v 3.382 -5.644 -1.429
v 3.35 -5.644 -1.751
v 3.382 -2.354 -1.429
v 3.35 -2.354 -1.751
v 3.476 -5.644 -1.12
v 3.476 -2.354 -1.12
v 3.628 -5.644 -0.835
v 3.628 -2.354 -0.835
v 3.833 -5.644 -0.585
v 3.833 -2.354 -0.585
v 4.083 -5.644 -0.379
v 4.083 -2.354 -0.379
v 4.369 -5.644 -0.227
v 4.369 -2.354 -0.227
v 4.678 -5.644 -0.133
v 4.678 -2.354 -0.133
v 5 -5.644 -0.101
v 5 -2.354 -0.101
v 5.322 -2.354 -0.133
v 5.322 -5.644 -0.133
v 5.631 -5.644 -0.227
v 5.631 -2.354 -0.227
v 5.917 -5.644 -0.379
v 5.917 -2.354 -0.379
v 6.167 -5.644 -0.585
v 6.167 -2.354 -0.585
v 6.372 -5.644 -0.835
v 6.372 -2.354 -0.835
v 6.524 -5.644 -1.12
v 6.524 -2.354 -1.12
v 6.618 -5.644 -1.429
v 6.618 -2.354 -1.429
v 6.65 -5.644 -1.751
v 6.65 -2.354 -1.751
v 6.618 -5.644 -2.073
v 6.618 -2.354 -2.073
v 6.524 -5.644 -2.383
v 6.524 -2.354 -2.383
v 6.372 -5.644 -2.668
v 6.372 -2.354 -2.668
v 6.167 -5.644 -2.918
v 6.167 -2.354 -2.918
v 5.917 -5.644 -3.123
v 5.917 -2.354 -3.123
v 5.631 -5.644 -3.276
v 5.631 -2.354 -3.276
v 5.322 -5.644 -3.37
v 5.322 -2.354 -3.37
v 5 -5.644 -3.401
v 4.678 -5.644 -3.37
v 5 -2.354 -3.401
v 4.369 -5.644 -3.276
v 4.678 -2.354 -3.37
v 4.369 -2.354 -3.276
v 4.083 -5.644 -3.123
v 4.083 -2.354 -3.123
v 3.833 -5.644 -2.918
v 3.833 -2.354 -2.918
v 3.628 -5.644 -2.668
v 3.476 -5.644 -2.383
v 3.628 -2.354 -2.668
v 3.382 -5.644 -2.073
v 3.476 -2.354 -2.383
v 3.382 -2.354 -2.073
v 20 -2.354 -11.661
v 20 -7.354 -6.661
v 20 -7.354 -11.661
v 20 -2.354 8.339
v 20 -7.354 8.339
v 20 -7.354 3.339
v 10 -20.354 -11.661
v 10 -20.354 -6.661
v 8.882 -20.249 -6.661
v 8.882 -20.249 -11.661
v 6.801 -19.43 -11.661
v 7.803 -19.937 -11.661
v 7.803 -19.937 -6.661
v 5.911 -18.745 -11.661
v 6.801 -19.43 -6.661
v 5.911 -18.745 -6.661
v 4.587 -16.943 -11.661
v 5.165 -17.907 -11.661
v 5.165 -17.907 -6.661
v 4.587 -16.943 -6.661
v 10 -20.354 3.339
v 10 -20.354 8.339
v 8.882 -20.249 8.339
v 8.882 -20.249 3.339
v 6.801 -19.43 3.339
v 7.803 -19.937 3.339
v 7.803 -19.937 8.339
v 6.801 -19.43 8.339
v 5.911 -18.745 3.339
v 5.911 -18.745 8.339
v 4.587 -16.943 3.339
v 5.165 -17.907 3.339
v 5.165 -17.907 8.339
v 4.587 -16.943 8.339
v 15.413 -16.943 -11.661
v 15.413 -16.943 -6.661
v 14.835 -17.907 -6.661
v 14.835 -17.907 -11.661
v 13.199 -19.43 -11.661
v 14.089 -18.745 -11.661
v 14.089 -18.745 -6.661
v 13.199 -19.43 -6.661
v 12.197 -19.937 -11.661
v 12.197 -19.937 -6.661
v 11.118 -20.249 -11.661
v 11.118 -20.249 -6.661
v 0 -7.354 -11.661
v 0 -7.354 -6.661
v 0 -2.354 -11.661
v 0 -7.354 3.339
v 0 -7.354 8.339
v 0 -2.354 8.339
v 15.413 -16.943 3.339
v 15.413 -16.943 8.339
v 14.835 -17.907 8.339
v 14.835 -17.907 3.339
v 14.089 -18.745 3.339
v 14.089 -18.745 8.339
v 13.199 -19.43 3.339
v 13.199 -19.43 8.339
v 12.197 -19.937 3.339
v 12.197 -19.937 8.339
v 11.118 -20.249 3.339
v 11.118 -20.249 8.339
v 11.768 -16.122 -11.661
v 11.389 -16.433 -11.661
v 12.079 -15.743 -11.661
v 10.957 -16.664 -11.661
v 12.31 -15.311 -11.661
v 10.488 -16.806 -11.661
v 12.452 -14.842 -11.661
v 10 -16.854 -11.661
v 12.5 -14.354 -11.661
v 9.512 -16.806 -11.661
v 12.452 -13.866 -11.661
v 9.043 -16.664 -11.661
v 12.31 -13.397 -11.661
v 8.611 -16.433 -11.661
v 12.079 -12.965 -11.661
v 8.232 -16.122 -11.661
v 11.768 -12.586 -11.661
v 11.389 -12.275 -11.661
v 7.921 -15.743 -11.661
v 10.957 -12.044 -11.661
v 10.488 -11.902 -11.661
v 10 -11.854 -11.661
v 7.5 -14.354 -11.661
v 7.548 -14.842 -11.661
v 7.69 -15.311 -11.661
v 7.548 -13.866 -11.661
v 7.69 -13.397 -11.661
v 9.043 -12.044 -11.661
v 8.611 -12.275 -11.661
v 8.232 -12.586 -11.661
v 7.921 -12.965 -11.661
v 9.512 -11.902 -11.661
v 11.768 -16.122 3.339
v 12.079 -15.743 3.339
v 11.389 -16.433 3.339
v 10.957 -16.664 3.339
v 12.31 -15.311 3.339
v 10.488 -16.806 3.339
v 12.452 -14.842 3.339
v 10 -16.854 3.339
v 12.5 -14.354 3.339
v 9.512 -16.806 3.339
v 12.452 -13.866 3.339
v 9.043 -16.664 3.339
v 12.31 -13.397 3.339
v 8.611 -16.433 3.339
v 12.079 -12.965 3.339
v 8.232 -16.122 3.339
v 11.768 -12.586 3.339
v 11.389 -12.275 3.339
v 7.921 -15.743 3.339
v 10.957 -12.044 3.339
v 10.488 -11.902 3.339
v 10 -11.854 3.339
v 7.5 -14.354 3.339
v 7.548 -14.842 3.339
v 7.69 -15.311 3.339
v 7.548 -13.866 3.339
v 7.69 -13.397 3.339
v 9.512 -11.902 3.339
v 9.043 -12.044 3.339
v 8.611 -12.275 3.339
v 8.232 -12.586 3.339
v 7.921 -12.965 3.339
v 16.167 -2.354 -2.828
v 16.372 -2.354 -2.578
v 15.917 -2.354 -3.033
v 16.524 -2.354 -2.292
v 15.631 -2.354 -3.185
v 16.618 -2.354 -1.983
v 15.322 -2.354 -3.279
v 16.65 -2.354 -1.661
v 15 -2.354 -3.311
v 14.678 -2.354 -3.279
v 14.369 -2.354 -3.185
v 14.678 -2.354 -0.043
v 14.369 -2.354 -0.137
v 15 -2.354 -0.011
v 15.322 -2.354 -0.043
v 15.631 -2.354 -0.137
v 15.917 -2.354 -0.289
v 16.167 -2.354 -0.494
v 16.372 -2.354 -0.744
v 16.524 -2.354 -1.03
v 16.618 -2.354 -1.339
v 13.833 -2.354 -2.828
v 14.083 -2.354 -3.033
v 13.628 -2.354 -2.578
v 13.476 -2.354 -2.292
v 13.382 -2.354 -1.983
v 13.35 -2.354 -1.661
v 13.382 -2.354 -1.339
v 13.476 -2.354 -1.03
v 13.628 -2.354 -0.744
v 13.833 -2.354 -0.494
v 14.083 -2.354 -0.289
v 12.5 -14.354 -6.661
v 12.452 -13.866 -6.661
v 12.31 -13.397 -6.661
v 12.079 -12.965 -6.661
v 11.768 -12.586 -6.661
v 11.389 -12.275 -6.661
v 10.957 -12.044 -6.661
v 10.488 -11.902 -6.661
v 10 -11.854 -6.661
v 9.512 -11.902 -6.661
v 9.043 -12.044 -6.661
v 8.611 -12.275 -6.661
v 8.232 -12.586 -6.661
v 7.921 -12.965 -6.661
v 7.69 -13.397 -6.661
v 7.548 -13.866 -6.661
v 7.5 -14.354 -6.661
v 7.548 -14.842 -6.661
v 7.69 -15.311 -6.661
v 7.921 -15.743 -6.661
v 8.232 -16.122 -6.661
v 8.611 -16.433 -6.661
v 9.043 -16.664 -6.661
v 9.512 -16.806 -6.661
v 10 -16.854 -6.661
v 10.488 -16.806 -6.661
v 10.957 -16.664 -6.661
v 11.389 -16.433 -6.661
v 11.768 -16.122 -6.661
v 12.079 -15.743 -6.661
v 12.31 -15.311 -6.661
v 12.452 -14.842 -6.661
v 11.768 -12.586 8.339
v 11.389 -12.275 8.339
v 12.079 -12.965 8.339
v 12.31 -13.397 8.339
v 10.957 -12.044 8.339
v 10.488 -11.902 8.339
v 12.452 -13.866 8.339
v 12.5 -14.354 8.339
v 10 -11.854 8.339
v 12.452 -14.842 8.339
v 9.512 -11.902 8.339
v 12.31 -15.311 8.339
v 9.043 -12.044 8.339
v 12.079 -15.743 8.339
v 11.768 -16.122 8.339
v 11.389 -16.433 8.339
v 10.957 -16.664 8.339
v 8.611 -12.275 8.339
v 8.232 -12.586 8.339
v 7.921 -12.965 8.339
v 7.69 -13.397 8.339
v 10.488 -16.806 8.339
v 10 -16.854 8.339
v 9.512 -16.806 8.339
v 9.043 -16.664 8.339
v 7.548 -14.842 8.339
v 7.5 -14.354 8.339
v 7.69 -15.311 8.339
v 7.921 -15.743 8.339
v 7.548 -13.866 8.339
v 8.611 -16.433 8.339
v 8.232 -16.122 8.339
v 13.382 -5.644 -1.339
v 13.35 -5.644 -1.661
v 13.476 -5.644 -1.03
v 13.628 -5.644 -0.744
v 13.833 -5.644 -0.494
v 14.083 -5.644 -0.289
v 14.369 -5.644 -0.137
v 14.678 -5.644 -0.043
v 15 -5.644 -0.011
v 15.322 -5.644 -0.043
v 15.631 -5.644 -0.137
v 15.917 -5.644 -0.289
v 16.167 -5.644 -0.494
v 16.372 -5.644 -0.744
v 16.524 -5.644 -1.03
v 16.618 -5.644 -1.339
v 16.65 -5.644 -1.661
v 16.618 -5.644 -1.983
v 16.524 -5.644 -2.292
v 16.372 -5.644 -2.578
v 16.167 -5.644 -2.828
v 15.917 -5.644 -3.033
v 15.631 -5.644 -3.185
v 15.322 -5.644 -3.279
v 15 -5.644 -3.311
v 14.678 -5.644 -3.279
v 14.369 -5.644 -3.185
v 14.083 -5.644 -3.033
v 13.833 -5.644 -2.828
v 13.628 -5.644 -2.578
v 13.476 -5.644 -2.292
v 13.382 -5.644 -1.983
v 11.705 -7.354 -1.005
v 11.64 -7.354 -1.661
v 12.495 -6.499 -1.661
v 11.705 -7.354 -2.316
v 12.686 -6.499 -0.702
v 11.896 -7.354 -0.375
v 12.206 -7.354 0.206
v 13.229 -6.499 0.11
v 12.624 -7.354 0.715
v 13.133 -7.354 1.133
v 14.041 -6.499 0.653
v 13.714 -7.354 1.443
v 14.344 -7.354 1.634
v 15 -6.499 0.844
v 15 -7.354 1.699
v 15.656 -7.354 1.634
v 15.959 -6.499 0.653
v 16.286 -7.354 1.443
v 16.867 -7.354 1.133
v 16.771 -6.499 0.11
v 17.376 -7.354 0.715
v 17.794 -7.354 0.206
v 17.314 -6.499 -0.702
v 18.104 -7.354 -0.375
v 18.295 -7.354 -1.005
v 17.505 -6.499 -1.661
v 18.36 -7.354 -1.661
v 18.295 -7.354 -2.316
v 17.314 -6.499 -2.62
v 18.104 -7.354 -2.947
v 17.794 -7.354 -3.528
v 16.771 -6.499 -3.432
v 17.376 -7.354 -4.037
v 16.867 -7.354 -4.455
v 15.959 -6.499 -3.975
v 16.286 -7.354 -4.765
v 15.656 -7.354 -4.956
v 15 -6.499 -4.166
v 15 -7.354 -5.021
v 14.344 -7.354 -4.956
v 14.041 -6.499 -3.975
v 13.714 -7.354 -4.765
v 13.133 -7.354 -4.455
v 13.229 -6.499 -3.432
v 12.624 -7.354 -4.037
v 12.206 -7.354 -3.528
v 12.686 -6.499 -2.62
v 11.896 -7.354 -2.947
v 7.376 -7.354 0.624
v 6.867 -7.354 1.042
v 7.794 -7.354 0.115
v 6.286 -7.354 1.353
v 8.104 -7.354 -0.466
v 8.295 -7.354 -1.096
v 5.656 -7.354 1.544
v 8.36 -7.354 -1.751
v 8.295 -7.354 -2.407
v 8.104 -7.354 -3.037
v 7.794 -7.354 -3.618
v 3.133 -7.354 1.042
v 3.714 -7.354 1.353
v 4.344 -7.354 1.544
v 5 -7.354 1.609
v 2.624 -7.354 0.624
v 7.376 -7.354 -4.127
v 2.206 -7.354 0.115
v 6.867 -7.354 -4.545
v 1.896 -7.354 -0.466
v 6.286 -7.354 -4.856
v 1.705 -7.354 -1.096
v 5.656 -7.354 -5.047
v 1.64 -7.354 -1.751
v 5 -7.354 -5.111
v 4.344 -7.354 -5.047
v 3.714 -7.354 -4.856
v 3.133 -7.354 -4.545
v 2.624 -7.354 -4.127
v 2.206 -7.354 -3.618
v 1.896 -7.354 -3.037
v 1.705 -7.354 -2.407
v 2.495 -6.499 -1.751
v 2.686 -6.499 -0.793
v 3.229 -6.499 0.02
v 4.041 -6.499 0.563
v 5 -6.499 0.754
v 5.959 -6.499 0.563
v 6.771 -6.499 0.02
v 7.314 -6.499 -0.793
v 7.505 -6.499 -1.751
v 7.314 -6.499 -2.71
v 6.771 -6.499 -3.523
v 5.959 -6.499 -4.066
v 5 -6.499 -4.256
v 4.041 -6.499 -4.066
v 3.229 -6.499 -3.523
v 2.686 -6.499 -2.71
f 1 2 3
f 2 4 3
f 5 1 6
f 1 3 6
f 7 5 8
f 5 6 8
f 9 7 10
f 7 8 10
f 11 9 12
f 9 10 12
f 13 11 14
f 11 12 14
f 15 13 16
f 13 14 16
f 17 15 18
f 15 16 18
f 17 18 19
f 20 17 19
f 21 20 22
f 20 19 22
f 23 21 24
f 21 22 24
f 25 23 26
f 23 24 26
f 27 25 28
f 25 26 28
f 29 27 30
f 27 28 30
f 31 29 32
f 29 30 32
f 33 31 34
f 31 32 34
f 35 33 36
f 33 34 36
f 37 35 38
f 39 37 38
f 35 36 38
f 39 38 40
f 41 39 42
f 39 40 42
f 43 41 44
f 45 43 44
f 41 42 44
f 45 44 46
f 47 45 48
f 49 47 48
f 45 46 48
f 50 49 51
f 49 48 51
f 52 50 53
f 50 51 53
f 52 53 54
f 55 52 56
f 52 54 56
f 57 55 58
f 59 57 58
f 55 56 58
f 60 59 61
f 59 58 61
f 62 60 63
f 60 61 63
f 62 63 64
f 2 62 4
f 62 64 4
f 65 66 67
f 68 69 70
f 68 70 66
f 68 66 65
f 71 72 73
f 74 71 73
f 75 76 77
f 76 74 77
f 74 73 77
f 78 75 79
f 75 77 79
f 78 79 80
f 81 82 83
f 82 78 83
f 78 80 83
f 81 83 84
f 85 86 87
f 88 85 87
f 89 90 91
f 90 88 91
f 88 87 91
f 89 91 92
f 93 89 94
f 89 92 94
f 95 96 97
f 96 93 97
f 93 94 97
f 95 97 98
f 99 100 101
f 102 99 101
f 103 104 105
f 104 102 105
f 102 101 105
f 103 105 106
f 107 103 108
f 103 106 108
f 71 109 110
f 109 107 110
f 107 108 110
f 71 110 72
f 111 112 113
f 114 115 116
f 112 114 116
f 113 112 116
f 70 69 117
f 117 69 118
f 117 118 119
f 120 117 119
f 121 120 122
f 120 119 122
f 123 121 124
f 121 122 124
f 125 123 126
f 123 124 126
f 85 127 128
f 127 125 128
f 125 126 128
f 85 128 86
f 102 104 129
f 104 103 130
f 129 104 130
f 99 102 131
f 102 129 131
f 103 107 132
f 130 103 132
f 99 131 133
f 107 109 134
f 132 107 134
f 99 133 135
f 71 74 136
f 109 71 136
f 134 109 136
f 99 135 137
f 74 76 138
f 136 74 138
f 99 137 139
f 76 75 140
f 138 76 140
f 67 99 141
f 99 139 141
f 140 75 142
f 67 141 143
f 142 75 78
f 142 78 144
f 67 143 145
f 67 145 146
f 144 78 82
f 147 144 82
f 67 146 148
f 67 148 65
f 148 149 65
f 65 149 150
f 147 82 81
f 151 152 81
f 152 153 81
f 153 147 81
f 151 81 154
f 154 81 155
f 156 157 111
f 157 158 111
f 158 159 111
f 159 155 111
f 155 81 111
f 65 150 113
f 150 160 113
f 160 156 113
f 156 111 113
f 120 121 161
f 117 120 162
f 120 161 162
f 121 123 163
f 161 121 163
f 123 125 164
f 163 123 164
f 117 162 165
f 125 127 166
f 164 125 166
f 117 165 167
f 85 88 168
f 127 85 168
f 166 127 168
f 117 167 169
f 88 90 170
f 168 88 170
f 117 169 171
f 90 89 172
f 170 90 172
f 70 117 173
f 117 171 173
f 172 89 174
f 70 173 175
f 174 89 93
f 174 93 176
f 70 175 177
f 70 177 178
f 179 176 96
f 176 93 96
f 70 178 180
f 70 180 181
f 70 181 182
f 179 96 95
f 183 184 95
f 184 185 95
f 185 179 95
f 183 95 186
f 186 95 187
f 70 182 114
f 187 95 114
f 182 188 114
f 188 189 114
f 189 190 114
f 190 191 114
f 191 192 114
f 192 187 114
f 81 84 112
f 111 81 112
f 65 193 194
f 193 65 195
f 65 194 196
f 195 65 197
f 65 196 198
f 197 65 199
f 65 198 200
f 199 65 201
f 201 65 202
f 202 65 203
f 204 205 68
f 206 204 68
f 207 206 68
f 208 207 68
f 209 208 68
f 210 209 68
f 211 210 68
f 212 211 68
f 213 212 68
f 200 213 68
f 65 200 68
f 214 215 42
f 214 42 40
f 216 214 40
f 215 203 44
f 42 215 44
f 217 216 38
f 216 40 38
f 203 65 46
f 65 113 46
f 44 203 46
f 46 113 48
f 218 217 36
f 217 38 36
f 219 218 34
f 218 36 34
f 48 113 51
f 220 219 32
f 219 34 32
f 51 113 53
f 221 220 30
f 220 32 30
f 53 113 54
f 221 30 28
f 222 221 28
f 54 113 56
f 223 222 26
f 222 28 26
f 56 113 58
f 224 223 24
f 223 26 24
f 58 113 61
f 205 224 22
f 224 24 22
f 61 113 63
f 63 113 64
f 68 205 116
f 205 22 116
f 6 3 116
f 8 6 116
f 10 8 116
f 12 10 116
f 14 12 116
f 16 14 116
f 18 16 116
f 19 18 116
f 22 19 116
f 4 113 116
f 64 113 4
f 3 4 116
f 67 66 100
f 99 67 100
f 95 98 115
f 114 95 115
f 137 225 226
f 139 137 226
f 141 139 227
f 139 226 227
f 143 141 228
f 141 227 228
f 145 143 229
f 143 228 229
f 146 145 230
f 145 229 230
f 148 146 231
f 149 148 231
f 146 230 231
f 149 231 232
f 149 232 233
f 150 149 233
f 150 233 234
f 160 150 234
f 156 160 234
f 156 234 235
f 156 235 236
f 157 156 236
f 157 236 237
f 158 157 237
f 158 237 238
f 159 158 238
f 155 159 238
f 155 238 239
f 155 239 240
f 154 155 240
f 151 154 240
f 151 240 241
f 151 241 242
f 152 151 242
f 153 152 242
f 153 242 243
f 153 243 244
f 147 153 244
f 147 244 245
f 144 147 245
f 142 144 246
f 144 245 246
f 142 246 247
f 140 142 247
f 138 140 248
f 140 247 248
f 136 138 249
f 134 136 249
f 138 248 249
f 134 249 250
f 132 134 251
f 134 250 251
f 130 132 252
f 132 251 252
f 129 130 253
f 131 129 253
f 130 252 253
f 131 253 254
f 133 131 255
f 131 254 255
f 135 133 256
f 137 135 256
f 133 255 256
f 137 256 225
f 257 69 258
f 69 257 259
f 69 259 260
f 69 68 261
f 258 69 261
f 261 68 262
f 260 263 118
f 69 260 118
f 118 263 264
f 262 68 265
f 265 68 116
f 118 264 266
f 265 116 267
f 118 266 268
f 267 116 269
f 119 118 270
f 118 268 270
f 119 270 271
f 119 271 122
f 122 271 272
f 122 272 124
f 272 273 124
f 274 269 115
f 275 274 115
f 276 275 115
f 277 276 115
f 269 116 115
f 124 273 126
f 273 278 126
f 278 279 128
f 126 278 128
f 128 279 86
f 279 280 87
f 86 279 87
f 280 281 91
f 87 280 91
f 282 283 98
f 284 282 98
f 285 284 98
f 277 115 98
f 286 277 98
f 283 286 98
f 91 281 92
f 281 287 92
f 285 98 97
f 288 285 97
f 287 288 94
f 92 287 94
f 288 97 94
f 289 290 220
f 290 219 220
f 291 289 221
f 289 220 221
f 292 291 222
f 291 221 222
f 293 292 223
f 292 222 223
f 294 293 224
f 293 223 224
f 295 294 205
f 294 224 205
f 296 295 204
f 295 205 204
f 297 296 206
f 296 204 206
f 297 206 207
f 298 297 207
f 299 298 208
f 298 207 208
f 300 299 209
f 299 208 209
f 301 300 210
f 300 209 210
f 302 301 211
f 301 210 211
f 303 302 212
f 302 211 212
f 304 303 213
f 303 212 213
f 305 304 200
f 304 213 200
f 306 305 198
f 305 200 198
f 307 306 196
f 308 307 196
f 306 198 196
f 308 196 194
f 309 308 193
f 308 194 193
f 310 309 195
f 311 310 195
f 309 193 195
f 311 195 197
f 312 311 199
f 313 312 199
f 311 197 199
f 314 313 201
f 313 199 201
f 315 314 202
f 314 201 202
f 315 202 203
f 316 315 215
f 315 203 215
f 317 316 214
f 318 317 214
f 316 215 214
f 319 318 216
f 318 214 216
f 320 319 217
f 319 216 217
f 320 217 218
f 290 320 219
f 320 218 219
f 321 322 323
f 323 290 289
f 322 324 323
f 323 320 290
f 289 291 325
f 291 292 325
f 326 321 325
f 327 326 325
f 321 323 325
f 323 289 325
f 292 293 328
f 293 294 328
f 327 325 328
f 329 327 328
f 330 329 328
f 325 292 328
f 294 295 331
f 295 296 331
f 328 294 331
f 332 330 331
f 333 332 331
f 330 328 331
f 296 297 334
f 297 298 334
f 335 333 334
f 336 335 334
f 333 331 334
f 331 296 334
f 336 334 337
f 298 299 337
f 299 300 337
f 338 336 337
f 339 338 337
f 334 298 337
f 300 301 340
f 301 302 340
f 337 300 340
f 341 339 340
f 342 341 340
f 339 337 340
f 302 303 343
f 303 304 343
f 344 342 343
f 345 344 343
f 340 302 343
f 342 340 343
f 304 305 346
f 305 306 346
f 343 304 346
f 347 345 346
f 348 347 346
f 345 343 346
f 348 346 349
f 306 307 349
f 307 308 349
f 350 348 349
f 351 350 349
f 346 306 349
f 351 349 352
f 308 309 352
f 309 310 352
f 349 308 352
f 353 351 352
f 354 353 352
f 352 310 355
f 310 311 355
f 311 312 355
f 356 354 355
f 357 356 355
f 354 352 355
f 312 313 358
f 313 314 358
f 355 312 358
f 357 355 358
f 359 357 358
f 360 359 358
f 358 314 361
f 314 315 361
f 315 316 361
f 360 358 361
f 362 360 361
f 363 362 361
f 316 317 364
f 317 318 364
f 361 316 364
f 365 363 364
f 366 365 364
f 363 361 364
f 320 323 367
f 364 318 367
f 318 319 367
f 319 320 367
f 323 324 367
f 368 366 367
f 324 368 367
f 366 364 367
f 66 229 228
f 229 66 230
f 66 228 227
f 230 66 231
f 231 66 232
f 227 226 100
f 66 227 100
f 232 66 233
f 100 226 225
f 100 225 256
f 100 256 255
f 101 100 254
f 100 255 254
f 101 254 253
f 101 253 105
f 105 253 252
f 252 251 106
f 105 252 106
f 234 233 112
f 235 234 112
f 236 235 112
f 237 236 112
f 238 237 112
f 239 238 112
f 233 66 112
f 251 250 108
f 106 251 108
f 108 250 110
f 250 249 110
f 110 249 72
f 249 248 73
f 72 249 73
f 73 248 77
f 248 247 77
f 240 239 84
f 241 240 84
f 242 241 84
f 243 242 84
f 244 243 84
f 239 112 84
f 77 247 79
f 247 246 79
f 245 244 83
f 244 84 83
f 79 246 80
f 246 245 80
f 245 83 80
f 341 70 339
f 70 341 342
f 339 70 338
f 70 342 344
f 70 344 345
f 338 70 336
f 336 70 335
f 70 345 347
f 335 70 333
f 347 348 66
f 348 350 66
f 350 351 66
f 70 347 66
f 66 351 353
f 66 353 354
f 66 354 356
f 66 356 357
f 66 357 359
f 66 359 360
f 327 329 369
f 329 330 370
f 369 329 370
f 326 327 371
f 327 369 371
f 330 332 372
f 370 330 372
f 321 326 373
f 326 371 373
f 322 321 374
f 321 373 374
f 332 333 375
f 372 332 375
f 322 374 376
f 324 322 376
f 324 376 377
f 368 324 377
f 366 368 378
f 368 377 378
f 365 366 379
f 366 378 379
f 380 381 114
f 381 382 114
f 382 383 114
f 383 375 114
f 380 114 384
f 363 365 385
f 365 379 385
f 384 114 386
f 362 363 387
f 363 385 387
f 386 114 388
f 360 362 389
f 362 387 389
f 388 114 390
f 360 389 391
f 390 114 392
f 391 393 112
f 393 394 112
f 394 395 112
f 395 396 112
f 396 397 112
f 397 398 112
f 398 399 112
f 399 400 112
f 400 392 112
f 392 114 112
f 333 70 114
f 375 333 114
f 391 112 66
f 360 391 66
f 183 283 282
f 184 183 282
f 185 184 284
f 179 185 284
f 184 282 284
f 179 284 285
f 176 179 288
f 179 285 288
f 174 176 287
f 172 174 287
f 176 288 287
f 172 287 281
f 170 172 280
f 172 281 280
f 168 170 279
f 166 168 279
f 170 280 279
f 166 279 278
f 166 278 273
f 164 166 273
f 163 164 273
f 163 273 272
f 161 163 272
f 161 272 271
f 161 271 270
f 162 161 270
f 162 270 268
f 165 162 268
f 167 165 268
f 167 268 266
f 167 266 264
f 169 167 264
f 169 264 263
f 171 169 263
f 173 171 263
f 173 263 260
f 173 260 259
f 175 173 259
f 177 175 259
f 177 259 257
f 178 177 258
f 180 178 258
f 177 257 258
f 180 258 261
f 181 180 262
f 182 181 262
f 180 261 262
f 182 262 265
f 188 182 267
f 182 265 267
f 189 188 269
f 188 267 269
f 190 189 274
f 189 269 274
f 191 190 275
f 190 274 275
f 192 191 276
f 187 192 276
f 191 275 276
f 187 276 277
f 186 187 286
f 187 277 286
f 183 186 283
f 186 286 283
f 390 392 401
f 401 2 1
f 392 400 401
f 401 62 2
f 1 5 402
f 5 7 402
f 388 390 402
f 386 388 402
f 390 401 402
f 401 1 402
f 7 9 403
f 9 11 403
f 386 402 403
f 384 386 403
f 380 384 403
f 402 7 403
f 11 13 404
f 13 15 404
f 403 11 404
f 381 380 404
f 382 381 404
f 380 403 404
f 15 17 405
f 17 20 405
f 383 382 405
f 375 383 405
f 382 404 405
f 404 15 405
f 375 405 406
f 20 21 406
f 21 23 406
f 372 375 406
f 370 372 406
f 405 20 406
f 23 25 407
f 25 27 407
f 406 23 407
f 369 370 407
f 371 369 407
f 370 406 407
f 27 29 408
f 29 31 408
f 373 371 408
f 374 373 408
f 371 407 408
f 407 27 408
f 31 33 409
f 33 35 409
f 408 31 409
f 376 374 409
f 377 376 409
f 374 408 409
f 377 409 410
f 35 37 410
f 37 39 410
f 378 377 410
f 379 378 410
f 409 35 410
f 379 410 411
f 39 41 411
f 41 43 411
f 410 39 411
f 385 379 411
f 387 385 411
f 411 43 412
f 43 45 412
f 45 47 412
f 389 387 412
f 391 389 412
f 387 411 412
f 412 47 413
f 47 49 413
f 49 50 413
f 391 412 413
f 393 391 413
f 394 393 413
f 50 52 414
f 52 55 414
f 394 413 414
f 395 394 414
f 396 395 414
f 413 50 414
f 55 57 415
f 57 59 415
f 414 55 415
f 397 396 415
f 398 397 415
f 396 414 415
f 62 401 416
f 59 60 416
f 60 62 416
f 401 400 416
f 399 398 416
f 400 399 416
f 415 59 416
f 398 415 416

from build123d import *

# Parameters (mm, degrees)
F1_DEPTH       = 20
F3_DEPTH       = 17.4
F4_D           = 5
F4_DEPTH       = 5.001
F5_D           = 5
F7_D           = 3.3
F7_CSINK_D     = 6.72
F7_CSINK_ANGLE = 90


with BuildPart() as f1:
    # F0 (on Right) → F1 (new body)
    with BuildSketch(Plane.YZ):
        Polygon((-2.3540243498, -11.660939306), (-2.3540243498, 8.339060694), (-20.3540243498, 8.339060694), (-20.3540243498, 3.339060694), (-7.3540243498, 3.339060694), (-7.3540243498, -6.660939306), (-20.3540243498, -6.660939306), (-20.3540243498, -11.660939306), align=None)
    extrude(amount=F1_DEPTH)

    # F2 (on face) → F3 (cut, symmetric)
    with BuildSketch(Plane.XY.offset(-6.660939306)):
        with BuildLine():
            ThreePointArc((10, -20.3540243498), (6.8012442082, -19.4302396116), (4.5874756769, -16.9433448113))
            Line((4.5874756769, -16.9433448113), (0, -7.3540243498))
            Line((0, -7.3540243498), (0, -20.3540243498))
            Line((0, -20.3540243498), (10, -20.3540243498))
        make_face()
        with BuildLine():
            ThreePointArc((15.4125243231, -16.9433448113), (13.1987557918, -19.4302396116), (10, -20.3540243498))
            Line((10, -20.3540243498), (20, -20.3540243498))
            Line((20, -20.3540243498), (20, -7.3540243498))
            Line((20, -7.3540243498), (15.4125243231, -16.9433448113))
        make_face()
    extrude(amount=F3_DEPTH, both=True, mode=Mode.SUBTRACT)

    # F4 (through all, one way)
    with BuildSketch(Plane.XY.offset(-6.660939306)):
        with Locations((10, -14.3540243498)):
            Circle(F4_D / 2)
    extrude(amount=-F4_DEPTH, mode=Mode.SUBTRACT)

    # F5 (through all)
    with Locations(Plane(origin=(0, 0, -6.660939306), x_dir=(1, 0, 0), z_dir=(0, 0, -1))):
        with Locations((10, 14.3540243498)):
            Hole(F5_D / 2)

    # F7 (through all)
    with Locations(Plane.XZ.offset(7.3540243498)):
        with Locations((5, -1.751396223), (15, -1.660939306)):
            CounterSinkHole(F7_D / 2, F7_CSINK_D / 2, counter_sink_angle=F7_CSINK_ANGLE)


solid = f1.part
